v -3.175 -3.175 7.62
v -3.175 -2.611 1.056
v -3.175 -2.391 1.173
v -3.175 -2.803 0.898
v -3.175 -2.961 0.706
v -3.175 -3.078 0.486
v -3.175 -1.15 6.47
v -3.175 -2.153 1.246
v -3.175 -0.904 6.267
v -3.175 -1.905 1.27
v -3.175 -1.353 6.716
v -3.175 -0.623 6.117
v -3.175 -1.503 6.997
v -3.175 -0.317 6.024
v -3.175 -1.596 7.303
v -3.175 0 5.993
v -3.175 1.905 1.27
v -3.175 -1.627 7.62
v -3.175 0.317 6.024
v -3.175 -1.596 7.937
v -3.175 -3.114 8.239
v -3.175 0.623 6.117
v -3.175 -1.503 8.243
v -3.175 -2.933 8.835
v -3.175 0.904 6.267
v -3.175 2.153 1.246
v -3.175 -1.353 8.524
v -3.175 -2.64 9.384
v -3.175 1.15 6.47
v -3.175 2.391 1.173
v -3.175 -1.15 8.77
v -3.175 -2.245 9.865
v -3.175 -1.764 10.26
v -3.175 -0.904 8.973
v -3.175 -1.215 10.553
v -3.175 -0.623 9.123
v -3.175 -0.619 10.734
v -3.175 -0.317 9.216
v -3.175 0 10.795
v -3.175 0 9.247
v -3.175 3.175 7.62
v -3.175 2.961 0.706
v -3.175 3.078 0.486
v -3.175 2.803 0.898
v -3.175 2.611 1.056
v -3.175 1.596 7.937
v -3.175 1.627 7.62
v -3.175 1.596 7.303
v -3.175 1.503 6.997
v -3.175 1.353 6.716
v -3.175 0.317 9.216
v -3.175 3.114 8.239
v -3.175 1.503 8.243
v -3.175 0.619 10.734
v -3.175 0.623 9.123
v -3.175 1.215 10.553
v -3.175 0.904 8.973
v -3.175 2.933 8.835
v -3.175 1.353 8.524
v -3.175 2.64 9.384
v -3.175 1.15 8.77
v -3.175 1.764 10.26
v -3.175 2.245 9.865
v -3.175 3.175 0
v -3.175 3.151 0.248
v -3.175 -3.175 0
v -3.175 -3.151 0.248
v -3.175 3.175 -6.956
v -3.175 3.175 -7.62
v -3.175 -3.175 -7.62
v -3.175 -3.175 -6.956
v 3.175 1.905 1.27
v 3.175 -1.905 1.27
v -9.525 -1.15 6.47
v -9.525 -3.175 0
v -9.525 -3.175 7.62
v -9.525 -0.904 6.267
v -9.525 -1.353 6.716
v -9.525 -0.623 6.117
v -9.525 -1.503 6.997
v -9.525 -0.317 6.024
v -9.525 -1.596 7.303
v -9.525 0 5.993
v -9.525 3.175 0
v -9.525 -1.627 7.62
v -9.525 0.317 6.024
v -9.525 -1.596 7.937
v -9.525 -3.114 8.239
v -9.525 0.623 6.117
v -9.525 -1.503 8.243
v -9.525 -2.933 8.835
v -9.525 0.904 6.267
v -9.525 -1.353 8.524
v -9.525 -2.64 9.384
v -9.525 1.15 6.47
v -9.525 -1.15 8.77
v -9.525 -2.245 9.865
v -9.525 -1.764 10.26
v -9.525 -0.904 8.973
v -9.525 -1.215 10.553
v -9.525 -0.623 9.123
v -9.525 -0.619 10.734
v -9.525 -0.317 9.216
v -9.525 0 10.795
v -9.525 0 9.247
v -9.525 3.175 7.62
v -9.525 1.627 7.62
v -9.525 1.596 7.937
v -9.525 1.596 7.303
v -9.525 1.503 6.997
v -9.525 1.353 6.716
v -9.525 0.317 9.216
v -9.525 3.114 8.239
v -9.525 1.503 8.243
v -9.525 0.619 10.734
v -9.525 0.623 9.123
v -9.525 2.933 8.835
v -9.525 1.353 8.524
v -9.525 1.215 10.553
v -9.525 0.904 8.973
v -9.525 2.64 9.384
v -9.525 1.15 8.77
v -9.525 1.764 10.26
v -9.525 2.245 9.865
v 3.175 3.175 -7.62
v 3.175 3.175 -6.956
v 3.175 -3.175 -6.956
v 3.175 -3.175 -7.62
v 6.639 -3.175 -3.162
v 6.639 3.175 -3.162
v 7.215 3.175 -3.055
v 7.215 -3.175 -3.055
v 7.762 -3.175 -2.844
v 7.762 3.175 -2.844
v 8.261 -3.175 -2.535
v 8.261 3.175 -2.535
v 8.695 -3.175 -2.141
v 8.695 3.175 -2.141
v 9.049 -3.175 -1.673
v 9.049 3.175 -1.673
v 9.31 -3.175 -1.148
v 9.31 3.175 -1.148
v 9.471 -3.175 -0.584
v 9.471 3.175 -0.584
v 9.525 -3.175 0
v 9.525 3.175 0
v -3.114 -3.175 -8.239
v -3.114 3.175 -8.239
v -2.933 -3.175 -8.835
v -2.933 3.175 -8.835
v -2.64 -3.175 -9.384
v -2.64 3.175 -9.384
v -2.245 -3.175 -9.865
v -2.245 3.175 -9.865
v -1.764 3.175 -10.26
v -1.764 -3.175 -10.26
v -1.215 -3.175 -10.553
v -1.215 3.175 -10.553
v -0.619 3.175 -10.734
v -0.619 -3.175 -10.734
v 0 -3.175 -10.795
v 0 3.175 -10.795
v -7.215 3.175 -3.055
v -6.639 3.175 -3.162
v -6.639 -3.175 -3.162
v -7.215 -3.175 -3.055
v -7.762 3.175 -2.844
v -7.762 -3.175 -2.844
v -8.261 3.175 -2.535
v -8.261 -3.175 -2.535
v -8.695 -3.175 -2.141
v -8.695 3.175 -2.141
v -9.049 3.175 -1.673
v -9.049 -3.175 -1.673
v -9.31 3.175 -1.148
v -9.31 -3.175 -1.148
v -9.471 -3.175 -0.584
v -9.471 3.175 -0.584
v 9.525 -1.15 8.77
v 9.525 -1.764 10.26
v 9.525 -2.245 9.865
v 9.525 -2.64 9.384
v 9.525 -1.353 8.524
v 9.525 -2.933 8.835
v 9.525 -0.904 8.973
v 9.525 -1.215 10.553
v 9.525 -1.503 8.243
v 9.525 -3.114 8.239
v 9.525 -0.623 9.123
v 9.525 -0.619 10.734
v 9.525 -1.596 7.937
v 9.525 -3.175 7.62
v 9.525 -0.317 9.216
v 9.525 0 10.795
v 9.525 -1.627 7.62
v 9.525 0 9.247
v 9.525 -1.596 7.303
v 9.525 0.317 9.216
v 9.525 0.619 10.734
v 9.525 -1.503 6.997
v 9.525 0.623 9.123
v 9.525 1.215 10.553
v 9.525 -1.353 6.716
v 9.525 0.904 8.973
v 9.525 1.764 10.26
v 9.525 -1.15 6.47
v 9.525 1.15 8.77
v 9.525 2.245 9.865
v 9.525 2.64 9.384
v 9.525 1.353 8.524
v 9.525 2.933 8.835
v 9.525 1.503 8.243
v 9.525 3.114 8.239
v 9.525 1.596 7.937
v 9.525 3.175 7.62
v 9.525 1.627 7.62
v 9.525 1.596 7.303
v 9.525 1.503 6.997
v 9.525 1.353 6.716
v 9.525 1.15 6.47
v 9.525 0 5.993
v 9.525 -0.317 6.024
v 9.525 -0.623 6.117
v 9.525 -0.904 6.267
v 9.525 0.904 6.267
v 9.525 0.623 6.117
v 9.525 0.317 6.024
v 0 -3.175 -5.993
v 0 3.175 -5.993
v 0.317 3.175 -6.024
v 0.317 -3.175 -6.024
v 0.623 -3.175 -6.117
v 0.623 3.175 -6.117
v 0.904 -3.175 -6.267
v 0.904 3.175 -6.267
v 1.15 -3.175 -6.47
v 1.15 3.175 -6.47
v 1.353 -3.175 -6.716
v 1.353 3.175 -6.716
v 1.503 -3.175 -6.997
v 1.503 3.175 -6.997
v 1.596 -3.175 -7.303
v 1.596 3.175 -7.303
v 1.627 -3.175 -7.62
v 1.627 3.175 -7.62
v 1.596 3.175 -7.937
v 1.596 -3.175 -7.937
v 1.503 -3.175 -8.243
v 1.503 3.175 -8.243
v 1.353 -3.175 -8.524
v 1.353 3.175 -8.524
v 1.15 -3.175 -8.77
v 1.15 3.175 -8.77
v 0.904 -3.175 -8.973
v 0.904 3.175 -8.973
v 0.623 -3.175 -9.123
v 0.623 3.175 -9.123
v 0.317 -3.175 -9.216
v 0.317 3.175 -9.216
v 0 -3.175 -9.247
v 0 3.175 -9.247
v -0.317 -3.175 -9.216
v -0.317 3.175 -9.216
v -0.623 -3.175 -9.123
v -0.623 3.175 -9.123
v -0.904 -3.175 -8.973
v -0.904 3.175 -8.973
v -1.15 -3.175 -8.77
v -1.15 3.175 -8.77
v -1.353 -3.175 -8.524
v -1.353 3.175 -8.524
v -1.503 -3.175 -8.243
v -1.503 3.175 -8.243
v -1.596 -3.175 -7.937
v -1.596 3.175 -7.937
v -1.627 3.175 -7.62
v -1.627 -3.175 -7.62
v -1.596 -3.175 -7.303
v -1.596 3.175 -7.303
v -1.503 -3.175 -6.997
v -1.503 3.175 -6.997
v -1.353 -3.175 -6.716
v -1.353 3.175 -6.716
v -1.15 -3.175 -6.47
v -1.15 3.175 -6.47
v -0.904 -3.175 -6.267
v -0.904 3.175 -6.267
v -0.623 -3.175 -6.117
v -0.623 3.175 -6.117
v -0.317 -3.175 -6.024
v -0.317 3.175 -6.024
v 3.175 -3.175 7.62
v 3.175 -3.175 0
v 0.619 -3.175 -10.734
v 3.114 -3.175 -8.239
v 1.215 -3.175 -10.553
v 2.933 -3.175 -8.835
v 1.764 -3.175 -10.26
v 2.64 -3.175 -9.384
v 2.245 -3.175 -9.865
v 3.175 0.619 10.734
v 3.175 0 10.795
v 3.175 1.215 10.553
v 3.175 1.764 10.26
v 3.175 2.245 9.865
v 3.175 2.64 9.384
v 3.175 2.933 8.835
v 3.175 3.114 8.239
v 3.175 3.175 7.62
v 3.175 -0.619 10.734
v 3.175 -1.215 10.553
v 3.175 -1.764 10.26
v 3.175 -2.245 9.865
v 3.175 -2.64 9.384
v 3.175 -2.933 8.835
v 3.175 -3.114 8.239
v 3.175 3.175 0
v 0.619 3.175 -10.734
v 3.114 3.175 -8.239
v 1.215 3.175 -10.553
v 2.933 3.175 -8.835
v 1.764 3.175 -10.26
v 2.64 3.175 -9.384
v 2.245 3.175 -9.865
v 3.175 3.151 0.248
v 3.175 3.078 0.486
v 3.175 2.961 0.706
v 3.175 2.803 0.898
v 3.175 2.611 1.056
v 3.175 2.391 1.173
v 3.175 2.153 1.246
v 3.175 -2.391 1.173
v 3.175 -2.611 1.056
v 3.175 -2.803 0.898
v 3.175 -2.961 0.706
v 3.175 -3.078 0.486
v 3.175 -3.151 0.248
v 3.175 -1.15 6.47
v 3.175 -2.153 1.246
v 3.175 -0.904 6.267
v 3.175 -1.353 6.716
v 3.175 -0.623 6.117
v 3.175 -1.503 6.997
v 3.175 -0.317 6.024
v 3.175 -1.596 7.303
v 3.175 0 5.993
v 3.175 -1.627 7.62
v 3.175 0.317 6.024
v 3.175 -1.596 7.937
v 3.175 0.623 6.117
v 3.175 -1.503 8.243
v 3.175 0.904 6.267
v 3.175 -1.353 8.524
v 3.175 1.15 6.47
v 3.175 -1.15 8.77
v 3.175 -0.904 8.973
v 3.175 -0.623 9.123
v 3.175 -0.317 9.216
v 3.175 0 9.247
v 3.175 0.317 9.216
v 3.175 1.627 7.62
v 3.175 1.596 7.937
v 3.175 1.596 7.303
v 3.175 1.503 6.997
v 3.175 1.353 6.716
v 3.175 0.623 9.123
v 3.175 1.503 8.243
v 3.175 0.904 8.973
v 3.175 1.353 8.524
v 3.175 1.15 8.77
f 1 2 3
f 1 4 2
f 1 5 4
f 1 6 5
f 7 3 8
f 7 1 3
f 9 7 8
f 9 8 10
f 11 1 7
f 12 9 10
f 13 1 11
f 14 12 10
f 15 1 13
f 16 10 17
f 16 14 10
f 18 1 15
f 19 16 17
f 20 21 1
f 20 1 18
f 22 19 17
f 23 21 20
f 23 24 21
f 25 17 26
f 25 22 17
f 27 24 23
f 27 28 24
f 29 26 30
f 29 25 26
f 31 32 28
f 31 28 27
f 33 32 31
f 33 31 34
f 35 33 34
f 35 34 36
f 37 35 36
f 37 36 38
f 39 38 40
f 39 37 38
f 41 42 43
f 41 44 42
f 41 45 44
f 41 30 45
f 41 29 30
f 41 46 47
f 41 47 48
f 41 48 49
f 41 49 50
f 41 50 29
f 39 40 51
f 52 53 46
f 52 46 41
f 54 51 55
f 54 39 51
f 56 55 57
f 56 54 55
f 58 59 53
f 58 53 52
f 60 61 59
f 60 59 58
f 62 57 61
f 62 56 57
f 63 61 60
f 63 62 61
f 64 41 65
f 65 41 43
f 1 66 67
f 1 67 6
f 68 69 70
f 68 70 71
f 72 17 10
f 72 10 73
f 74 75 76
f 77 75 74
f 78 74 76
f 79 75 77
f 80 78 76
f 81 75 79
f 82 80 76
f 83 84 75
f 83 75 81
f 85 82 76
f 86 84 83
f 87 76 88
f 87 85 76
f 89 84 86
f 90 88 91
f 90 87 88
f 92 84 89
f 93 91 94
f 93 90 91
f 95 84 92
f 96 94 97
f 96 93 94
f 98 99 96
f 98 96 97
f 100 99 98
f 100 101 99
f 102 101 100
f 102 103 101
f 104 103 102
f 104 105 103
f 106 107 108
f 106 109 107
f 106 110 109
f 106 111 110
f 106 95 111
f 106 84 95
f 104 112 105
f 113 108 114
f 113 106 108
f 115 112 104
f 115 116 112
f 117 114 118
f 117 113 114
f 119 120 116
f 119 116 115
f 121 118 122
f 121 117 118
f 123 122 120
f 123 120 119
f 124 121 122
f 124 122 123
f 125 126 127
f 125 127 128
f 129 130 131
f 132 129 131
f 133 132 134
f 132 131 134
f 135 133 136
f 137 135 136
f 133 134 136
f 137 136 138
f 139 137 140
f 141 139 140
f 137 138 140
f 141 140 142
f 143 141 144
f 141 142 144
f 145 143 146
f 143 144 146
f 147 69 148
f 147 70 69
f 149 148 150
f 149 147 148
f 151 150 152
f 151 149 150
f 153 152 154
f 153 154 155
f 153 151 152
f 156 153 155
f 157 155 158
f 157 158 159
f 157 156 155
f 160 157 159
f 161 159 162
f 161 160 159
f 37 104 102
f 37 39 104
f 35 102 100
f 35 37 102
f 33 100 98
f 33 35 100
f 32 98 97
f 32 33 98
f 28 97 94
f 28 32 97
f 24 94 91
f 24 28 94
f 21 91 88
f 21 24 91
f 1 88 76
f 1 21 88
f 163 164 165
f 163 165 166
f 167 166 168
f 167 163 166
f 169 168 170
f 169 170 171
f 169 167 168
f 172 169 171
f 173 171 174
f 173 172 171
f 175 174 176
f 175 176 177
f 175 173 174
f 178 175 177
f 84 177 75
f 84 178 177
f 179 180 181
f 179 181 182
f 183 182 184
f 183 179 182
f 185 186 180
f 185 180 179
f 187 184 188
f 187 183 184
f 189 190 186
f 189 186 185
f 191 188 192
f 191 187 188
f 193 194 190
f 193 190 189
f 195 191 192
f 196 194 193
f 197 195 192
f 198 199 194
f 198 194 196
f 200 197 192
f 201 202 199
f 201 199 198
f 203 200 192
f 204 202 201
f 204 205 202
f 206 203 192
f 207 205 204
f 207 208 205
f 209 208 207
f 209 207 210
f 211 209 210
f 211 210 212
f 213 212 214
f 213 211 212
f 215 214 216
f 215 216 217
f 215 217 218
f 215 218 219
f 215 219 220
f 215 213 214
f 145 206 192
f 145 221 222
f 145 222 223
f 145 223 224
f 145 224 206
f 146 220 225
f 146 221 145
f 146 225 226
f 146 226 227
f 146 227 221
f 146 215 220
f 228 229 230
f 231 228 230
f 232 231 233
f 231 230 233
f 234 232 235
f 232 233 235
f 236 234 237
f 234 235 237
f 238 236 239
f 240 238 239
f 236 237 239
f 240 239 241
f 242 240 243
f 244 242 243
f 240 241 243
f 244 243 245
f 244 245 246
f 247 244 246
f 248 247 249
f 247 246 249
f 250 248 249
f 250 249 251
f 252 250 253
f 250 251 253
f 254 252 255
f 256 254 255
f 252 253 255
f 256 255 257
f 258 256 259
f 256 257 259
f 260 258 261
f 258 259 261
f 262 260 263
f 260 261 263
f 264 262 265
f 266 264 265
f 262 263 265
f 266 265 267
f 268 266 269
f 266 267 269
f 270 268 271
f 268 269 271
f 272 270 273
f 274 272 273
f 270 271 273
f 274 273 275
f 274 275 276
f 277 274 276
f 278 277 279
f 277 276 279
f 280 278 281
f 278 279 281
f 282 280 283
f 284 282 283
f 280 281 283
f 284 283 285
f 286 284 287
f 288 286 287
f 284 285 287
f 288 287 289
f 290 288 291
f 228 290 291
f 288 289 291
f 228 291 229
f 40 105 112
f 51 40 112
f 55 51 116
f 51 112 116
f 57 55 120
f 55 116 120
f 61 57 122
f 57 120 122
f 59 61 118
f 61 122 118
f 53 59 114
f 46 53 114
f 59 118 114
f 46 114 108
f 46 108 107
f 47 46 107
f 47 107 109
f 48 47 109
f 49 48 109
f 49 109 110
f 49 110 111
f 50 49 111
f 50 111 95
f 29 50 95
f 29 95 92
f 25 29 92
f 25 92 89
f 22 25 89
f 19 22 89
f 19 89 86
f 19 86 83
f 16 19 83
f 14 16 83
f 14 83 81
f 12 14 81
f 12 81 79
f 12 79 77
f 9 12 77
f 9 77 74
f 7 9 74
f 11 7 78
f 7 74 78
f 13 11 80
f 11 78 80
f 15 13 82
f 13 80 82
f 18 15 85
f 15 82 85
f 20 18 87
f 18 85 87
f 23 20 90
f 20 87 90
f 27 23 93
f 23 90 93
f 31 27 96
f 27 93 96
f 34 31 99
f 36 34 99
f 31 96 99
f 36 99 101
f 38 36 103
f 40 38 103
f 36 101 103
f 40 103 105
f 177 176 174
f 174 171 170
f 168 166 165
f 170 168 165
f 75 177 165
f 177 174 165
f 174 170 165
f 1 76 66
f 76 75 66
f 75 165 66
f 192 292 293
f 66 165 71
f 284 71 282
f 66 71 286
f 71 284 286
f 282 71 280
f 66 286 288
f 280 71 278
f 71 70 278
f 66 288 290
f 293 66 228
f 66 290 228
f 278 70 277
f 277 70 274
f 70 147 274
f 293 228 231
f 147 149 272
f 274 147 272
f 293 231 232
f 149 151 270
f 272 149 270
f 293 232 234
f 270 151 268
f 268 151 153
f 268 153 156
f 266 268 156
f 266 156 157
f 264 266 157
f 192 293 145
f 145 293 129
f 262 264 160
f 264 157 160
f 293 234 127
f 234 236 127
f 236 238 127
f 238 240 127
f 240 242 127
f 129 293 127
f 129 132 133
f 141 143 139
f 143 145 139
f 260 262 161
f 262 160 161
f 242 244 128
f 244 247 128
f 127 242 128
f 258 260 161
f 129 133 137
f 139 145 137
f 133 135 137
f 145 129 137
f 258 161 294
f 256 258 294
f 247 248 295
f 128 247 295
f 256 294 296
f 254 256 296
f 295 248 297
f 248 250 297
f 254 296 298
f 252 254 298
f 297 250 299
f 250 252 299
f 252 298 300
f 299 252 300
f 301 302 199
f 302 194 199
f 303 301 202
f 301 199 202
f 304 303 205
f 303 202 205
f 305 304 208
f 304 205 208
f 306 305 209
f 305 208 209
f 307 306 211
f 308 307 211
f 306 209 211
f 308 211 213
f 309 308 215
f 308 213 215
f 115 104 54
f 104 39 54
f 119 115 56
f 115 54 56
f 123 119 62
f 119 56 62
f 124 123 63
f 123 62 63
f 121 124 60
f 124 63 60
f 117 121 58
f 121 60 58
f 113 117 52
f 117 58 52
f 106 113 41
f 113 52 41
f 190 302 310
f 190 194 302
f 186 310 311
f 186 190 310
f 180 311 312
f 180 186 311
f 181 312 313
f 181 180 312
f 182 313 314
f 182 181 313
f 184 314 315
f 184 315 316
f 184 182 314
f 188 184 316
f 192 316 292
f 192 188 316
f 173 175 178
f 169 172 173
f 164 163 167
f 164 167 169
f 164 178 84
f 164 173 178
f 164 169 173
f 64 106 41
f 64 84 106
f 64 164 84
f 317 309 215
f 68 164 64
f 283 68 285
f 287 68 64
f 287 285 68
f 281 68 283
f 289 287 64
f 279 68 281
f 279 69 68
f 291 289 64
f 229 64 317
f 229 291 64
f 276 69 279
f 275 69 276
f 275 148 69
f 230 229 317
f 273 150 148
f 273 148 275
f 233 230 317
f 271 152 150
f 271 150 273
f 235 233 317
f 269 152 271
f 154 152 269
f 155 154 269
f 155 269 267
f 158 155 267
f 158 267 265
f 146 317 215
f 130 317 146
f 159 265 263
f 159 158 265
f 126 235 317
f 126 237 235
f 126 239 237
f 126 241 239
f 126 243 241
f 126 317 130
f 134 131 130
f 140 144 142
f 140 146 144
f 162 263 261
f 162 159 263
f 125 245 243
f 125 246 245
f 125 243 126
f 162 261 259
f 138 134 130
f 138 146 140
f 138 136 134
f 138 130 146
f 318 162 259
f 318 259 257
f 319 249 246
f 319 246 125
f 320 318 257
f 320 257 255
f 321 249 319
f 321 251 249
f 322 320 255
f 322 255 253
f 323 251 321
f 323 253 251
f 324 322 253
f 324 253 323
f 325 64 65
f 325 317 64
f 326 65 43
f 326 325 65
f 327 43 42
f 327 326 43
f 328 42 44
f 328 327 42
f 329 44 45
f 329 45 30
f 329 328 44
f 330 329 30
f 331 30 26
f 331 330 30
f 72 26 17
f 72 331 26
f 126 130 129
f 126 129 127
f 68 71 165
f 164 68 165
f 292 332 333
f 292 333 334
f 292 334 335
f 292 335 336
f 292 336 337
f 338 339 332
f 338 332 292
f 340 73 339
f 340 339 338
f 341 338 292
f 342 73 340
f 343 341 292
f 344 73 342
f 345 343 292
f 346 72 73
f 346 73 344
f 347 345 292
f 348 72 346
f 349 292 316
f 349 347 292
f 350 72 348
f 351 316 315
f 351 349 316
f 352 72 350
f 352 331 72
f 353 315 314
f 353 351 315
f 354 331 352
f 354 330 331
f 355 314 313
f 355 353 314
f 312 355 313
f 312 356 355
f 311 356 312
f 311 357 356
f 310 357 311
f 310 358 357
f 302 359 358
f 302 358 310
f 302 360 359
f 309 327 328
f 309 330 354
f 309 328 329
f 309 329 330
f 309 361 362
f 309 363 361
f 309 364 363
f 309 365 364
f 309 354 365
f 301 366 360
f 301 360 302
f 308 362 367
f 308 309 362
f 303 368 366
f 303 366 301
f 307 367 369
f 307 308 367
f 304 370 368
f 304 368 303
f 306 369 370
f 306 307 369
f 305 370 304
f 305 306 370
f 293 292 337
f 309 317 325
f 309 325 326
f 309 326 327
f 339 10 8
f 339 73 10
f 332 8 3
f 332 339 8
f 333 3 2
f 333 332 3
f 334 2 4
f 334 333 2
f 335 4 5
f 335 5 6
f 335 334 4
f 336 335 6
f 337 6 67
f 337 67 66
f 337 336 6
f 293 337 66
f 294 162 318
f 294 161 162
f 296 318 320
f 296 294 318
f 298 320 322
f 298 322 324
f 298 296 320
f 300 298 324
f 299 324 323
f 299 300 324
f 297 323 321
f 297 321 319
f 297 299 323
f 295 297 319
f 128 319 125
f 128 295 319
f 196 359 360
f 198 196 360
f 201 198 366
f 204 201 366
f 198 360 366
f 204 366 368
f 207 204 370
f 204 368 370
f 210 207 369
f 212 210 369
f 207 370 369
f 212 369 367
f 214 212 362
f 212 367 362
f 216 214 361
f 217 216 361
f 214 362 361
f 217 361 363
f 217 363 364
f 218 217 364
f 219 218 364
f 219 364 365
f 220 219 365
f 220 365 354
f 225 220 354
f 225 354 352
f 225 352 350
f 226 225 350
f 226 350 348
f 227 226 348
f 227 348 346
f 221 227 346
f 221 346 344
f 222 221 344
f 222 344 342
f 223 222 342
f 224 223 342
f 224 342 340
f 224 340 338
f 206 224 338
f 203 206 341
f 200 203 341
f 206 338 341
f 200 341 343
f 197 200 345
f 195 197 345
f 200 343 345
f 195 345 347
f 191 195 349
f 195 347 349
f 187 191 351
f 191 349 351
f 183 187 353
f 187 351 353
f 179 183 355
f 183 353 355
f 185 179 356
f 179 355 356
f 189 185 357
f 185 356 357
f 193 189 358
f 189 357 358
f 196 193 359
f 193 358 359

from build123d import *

# Parameters (mm, degrees)
BOSS_EXTRUDE1_DEPTH = 3.175
FILLET1_R           = 3.175
CUT_EXTRUDE1_REACH  = 24.125
SKETCH2_R           = 1.627
SKETCH3_R           = 1.627
CUT_EXTRUDE2_DEPTH  = 6.35
SKETCH4_W           = 6.35
SKETCH4_H           = 6.35
CUT_EXTRUDE3_DEPTH  = 1.905
FILLET2_R           = 1.27
CHAMFER1_START      = -3.175
CHAMFER1_DEPTH      = 6.35


with BuildPart() as part:
    # Sketch1 → Boss-Extrude1 (new, symmetric)
    with BuildSketch(Plane(origin=(0, 0, 0), x_dir=(1, 0, 0), z_dir=(0, 1, 0))):
        Polygon((-3.175, 3.175), (-9.525, 3.175), (-9.525, -3.175), (-9.525, -10.795), (-3.175, -10.795), (-3.175, -3.175), (3.175, -3.175), (3.175, -10.795), (9.525, -10.795), (9.525, -3.175), (9.525, 3.175), (3.175, 3.175), (3.175, 10.795), (-3.175, 10.795), align=None)
    extrude(amount=BOSS_EXTRUDE1_DEPTH, both=True)

    # Fillet1
    fillet1_edges = [part.edges().sort_by_distance(p)[0] for p in [
        (3.175, 0, -10.795),
        (-3.175, 0, -10.795),
        (6.35, -3.175, 10.795),
        (6.35, 3.175, 10.795),
        (-6.35, -3.175, 10.795),
        (-6.35, 3.175, 10.795),
        (-9.525, 0, -3.175),
        (9.525, 0, -3.175),
    ]]
    fillet(fillet1_edges, radius=FILLET1_R - 0.0001)  # a hair under: the kernel refuses the full size

    # Cut-Extrude1: up to this face of the body (flat: up to its plane)
    cut_extrude1_end = Plane(part.part.faces().sort_by_distance((9.525, 0, 5.081615958))[0])
    # Sketch2 → Cut-Extrude1 (cut, up to the picked face)
    with BuildSketch(Plane.ZY.offset(9.525), mode=Mode.PRIVATE) as cut_extrude1_sk1:
        with Locations((7.62, 0)):
            Circle(SKETCH2_R)
    cut_extrude1_tool1 = split(extrude(cut_extrude1_sk1.sketch, amount=-CUT_EXTRUDE1_REACH, mode=Mode.PRIVATE), bisect_by=cut_extrude1_end, keep=Keep.BOTH, mode=Mode.PRIVATE)
    add(cut_extrude1_tool1.solids().sort_by(Axis((-9.525, 0, 7.62), (1, 0, 0)))[0], mode=Mode.SUBTRACT)

    # Sketch3 → Cut-Extrude2 (cut)
    with BuildSketch(Plane(origin=(0, 3.175, 0), x_dir=(1, 0, 0), z_dir=(0, 1, 0))):
        with Locations(Location((0, 7.62, 0), (0, 0, 270))):
            Circle(SKETCH3_R)
    extrude(amount=-CUT_EXTRUDE2_DEPTH, mode=Mode.SUBTRACT)

    # Sketch4 → Cut-Extrude3 (cut)
    with BuildSketch(Plane.XY.offset(3.175)):
        Rectangle(SKETCH4_W, SKETCH4_H)
    extrude(amount=-CUT_EXTRUDE3_DEPTH, mode=Mode.SUBTRACT)

    # Fillet2
    fillet2_edges = [part.edges().sort_by_distance(p)[0] for p in [
        (0, 3.175, 1.27),
        (0, -3.175, 1.27),
    ]]
    fillet(fillet2_edges, radius=FILLET2_R)

    # Chamfer1: read off the stored shape, not the designer's step
    # Chamfer1 outline → Chamfer1 (add)
    with BuildSketch(Plane(origin=(0, 0, 0), x_dir=(1, 0, 0), z_dir=(0, 1, 0)).offset(CHAMFER1_START)):
        with BuildLine():
            Line((6.638636364, 3.161852945), (3.175, 6.95607648))
            Line((3.175, 6.95607648), (3.175, 3.175))
            Line((3.175, 3.175), (6.35, 3.175))
            ThreePointArc((6.35, 3.175), (6.494467813, 3.171711533), (6.638636364, 3.161852945))
        make_face()
        with BuildLine():
            Line((-3.175, 6.95607648), (-6.638636364, 3.161852945))
            ThreePointArc((-6.638636364, 3.161852945), (-6.494467813, 3.171711533), (-6.35, 3.175))
            Line((-6.35, 3.175), (-3.175, 3.175))
            Line((-3.175, 3.175), (-3.175, 6.95607648))
        make_face()
    extrude(amount=CHAMFER1_DEPTH)


solid = part.part
